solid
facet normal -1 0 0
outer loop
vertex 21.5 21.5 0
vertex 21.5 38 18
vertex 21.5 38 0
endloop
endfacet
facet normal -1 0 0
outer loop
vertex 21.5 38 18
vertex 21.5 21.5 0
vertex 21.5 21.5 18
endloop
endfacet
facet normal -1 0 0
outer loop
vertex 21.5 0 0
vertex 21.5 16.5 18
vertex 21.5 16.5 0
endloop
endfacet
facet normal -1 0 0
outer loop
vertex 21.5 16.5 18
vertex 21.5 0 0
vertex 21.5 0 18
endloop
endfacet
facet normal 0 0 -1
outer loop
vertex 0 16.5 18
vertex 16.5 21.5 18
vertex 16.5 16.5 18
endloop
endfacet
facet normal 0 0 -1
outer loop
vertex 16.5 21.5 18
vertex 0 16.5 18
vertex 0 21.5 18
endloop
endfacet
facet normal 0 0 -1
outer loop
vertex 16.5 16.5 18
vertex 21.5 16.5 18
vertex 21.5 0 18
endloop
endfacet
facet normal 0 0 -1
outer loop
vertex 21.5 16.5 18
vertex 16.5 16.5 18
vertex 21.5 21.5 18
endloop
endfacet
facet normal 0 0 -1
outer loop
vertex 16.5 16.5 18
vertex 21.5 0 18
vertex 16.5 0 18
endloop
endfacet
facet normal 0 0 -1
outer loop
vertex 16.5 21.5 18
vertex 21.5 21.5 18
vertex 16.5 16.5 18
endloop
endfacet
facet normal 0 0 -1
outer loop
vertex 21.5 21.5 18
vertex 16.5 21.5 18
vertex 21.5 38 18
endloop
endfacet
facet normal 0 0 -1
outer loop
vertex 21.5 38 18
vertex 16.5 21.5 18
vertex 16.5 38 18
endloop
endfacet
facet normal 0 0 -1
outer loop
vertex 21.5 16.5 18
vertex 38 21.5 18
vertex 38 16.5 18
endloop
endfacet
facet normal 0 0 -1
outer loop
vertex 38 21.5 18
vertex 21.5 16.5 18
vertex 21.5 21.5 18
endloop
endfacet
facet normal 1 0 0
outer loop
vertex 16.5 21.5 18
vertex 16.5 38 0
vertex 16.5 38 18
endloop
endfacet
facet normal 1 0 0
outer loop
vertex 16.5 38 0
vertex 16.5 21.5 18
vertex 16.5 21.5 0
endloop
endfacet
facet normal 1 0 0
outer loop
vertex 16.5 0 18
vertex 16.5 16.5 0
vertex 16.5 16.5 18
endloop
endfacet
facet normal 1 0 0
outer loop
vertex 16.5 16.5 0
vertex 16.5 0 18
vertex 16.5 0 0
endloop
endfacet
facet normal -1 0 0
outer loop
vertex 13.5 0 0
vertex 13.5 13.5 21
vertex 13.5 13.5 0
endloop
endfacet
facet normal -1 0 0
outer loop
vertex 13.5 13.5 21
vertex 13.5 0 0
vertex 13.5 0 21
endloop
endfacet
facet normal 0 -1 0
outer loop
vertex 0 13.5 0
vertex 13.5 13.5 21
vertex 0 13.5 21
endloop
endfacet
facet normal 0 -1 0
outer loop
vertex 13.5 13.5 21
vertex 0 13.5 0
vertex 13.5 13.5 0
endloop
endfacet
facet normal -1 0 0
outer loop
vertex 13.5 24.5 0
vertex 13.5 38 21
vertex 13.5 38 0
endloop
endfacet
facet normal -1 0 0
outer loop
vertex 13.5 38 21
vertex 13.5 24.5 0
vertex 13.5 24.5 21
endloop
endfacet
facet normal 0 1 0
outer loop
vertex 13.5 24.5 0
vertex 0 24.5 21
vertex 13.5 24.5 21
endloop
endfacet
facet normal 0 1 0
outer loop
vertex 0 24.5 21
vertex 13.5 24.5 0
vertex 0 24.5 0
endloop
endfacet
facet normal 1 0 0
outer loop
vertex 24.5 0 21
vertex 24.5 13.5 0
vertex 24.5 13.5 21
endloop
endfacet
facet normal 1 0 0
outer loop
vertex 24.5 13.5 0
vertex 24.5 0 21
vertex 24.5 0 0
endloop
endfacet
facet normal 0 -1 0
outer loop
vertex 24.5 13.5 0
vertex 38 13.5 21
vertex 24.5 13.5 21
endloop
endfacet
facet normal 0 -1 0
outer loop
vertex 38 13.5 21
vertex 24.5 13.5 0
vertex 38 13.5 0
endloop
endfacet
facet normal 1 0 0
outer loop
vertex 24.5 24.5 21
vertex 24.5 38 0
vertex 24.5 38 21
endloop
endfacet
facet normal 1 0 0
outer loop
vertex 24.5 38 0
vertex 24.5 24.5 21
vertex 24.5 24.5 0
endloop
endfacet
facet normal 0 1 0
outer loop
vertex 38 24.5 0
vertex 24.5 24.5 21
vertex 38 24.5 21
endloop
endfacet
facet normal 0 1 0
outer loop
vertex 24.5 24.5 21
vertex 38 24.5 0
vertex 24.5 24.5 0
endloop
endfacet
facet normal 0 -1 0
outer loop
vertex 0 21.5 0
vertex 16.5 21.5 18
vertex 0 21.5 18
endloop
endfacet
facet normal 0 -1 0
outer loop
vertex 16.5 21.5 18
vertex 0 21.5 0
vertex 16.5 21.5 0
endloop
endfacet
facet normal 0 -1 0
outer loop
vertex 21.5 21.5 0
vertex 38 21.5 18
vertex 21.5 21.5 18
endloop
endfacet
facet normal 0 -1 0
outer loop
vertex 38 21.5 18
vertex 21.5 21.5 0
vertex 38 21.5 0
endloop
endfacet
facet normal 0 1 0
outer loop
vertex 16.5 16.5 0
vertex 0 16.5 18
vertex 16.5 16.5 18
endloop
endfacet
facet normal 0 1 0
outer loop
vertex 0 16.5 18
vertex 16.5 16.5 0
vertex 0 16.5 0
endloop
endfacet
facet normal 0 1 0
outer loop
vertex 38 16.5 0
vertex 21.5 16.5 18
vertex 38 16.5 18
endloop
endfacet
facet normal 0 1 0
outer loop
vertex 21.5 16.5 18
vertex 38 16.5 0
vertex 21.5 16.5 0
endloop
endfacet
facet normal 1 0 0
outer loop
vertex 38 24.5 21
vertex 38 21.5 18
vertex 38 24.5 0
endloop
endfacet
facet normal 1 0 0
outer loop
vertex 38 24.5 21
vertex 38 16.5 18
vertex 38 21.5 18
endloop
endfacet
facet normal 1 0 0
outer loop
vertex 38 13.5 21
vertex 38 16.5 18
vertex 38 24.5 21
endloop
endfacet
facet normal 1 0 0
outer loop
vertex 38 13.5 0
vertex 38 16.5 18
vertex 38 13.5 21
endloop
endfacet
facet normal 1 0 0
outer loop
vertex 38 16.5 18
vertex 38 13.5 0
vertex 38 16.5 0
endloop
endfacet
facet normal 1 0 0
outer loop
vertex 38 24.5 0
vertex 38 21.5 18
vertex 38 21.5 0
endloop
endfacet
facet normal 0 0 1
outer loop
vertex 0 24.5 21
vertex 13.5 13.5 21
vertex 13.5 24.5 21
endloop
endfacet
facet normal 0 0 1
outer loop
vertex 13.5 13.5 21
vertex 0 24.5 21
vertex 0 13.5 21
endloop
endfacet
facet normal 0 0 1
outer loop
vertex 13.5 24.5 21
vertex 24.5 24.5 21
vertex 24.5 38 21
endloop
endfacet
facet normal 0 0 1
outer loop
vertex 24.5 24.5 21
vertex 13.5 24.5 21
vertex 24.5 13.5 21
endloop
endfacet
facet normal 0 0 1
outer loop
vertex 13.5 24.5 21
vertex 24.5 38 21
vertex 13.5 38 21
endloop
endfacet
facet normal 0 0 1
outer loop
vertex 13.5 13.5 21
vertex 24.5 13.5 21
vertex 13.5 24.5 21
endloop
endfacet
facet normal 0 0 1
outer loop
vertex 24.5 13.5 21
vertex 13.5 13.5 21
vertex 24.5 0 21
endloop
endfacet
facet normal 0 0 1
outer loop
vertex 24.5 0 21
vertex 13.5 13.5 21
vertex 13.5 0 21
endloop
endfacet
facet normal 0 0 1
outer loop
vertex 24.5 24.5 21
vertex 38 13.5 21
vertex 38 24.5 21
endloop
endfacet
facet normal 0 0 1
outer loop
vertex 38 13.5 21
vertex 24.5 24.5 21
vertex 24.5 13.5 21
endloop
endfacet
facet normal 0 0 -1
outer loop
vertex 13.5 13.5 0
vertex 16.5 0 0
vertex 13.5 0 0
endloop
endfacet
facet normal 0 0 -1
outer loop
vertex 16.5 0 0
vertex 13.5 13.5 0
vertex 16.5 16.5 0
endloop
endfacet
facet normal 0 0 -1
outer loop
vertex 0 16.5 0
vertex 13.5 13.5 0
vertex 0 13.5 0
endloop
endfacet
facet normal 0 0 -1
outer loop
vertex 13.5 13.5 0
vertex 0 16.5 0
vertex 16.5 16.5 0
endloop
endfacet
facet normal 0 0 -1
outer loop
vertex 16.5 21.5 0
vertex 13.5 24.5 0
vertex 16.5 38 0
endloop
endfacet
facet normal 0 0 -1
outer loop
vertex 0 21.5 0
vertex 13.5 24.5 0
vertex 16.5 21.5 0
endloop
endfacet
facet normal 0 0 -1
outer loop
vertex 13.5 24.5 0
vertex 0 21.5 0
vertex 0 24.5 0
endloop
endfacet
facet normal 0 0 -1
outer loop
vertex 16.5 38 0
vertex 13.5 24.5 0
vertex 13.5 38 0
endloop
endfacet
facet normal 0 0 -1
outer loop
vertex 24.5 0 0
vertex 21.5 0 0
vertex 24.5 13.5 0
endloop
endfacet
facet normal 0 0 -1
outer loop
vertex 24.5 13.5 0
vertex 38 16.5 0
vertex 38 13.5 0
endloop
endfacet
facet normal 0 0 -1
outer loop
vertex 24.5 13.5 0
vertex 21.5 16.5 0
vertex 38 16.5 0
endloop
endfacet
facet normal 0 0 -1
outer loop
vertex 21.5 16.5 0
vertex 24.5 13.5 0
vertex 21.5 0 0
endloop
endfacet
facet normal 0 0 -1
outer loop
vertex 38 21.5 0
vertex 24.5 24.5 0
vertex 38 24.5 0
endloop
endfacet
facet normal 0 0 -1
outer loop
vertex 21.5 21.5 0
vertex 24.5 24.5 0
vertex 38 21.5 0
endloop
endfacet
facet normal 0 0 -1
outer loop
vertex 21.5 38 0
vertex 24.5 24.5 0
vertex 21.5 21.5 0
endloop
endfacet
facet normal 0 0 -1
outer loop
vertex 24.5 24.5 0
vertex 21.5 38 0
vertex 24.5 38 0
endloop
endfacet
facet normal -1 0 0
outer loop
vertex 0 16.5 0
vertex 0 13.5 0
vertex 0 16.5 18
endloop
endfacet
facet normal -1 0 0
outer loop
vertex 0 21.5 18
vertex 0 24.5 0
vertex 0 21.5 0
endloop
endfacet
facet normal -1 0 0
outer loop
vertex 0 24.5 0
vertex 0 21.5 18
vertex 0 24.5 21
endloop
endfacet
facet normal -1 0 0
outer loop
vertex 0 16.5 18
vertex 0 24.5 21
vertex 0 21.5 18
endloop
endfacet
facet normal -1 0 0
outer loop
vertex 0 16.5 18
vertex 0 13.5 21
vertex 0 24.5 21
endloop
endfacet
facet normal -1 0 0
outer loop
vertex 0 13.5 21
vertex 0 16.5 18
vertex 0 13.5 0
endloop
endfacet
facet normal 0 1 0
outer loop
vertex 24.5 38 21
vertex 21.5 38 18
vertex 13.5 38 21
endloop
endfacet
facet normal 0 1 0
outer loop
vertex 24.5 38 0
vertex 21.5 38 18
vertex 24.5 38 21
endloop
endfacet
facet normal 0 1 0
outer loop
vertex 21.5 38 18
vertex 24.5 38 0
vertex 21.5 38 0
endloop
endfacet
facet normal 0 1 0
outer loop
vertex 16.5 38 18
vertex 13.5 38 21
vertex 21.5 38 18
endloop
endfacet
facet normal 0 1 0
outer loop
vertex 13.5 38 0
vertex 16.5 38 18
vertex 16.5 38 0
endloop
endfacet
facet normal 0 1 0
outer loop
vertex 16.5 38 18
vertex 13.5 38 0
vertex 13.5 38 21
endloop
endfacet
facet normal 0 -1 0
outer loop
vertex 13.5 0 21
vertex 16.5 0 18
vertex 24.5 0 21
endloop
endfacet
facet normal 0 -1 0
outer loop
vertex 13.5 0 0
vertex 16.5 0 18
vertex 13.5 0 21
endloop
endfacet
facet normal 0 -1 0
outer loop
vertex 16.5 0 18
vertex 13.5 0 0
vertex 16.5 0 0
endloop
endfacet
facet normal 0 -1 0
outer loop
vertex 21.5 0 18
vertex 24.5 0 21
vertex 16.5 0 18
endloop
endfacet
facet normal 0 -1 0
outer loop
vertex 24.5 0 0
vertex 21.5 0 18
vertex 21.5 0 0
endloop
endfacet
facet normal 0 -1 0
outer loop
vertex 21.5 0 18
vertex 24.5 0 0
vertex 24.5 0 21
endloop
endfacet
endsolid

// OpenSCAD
/* "X" Panel connector generator by Llorenç Garcia 16/10/2024, https://github.com/Siot
 *
 * Licensing: 
 * This user content is licensed under a
Creative Commons Attribution-Noncommercial-Share Alike (https://creativecommons.org/licenses/by-nc-sa/4.0/)
*/

innerDuctWidth = 5;
outerArmLength = 13.5;
wallThickness = 3;
innerWallHeight = 18;

/* [Hidden] */
fullDuctLength = outerArmLength+wallThickness+innerDuctWidth + wallThickness + outerArmLength;
fullHeight = innerWallHeight + wallThickness; 

difference() {
    
    cube([fullDuctLength,fullDuctLength, fullHeight]);

    union() {
            translate([outerArmLength+wallThickness, -1, -1]) {
            cube([innerDuctWidth,fullDuctLength+2,innerWallHeight+1]);
        }
        
        translate([-1, -1, -1]) {
            cube([outerArmLength+1,outerArmLength+1,fullHeight+2]);
        }
        
        translate([-1, fullDuctLength - outerArmLength, -1]) {
            cube([outerArmLength+1,outerArmLength+1,fullHeight+2]);
        }
        
        translate([fullDuctLength - outerArmLength, -1, -1]) {
            cube([outerArmLength+1,outerArmLength+1,fullHeight+2]);
        }
        
        translate([fullDuctLength - outerArmLength, fullDuctLength - outerArmLength, -1]) {
            cube([outerArmLength+1,outerArmLength+1,fullHeight+2]);
        }
        
        
        translate([-1, outerArmLength+wallThickness, -1]) {
            cube([fullDuctLength+2,innerDuctWidth,innerWallHeight+1]);
        }
        
    }
    

}
